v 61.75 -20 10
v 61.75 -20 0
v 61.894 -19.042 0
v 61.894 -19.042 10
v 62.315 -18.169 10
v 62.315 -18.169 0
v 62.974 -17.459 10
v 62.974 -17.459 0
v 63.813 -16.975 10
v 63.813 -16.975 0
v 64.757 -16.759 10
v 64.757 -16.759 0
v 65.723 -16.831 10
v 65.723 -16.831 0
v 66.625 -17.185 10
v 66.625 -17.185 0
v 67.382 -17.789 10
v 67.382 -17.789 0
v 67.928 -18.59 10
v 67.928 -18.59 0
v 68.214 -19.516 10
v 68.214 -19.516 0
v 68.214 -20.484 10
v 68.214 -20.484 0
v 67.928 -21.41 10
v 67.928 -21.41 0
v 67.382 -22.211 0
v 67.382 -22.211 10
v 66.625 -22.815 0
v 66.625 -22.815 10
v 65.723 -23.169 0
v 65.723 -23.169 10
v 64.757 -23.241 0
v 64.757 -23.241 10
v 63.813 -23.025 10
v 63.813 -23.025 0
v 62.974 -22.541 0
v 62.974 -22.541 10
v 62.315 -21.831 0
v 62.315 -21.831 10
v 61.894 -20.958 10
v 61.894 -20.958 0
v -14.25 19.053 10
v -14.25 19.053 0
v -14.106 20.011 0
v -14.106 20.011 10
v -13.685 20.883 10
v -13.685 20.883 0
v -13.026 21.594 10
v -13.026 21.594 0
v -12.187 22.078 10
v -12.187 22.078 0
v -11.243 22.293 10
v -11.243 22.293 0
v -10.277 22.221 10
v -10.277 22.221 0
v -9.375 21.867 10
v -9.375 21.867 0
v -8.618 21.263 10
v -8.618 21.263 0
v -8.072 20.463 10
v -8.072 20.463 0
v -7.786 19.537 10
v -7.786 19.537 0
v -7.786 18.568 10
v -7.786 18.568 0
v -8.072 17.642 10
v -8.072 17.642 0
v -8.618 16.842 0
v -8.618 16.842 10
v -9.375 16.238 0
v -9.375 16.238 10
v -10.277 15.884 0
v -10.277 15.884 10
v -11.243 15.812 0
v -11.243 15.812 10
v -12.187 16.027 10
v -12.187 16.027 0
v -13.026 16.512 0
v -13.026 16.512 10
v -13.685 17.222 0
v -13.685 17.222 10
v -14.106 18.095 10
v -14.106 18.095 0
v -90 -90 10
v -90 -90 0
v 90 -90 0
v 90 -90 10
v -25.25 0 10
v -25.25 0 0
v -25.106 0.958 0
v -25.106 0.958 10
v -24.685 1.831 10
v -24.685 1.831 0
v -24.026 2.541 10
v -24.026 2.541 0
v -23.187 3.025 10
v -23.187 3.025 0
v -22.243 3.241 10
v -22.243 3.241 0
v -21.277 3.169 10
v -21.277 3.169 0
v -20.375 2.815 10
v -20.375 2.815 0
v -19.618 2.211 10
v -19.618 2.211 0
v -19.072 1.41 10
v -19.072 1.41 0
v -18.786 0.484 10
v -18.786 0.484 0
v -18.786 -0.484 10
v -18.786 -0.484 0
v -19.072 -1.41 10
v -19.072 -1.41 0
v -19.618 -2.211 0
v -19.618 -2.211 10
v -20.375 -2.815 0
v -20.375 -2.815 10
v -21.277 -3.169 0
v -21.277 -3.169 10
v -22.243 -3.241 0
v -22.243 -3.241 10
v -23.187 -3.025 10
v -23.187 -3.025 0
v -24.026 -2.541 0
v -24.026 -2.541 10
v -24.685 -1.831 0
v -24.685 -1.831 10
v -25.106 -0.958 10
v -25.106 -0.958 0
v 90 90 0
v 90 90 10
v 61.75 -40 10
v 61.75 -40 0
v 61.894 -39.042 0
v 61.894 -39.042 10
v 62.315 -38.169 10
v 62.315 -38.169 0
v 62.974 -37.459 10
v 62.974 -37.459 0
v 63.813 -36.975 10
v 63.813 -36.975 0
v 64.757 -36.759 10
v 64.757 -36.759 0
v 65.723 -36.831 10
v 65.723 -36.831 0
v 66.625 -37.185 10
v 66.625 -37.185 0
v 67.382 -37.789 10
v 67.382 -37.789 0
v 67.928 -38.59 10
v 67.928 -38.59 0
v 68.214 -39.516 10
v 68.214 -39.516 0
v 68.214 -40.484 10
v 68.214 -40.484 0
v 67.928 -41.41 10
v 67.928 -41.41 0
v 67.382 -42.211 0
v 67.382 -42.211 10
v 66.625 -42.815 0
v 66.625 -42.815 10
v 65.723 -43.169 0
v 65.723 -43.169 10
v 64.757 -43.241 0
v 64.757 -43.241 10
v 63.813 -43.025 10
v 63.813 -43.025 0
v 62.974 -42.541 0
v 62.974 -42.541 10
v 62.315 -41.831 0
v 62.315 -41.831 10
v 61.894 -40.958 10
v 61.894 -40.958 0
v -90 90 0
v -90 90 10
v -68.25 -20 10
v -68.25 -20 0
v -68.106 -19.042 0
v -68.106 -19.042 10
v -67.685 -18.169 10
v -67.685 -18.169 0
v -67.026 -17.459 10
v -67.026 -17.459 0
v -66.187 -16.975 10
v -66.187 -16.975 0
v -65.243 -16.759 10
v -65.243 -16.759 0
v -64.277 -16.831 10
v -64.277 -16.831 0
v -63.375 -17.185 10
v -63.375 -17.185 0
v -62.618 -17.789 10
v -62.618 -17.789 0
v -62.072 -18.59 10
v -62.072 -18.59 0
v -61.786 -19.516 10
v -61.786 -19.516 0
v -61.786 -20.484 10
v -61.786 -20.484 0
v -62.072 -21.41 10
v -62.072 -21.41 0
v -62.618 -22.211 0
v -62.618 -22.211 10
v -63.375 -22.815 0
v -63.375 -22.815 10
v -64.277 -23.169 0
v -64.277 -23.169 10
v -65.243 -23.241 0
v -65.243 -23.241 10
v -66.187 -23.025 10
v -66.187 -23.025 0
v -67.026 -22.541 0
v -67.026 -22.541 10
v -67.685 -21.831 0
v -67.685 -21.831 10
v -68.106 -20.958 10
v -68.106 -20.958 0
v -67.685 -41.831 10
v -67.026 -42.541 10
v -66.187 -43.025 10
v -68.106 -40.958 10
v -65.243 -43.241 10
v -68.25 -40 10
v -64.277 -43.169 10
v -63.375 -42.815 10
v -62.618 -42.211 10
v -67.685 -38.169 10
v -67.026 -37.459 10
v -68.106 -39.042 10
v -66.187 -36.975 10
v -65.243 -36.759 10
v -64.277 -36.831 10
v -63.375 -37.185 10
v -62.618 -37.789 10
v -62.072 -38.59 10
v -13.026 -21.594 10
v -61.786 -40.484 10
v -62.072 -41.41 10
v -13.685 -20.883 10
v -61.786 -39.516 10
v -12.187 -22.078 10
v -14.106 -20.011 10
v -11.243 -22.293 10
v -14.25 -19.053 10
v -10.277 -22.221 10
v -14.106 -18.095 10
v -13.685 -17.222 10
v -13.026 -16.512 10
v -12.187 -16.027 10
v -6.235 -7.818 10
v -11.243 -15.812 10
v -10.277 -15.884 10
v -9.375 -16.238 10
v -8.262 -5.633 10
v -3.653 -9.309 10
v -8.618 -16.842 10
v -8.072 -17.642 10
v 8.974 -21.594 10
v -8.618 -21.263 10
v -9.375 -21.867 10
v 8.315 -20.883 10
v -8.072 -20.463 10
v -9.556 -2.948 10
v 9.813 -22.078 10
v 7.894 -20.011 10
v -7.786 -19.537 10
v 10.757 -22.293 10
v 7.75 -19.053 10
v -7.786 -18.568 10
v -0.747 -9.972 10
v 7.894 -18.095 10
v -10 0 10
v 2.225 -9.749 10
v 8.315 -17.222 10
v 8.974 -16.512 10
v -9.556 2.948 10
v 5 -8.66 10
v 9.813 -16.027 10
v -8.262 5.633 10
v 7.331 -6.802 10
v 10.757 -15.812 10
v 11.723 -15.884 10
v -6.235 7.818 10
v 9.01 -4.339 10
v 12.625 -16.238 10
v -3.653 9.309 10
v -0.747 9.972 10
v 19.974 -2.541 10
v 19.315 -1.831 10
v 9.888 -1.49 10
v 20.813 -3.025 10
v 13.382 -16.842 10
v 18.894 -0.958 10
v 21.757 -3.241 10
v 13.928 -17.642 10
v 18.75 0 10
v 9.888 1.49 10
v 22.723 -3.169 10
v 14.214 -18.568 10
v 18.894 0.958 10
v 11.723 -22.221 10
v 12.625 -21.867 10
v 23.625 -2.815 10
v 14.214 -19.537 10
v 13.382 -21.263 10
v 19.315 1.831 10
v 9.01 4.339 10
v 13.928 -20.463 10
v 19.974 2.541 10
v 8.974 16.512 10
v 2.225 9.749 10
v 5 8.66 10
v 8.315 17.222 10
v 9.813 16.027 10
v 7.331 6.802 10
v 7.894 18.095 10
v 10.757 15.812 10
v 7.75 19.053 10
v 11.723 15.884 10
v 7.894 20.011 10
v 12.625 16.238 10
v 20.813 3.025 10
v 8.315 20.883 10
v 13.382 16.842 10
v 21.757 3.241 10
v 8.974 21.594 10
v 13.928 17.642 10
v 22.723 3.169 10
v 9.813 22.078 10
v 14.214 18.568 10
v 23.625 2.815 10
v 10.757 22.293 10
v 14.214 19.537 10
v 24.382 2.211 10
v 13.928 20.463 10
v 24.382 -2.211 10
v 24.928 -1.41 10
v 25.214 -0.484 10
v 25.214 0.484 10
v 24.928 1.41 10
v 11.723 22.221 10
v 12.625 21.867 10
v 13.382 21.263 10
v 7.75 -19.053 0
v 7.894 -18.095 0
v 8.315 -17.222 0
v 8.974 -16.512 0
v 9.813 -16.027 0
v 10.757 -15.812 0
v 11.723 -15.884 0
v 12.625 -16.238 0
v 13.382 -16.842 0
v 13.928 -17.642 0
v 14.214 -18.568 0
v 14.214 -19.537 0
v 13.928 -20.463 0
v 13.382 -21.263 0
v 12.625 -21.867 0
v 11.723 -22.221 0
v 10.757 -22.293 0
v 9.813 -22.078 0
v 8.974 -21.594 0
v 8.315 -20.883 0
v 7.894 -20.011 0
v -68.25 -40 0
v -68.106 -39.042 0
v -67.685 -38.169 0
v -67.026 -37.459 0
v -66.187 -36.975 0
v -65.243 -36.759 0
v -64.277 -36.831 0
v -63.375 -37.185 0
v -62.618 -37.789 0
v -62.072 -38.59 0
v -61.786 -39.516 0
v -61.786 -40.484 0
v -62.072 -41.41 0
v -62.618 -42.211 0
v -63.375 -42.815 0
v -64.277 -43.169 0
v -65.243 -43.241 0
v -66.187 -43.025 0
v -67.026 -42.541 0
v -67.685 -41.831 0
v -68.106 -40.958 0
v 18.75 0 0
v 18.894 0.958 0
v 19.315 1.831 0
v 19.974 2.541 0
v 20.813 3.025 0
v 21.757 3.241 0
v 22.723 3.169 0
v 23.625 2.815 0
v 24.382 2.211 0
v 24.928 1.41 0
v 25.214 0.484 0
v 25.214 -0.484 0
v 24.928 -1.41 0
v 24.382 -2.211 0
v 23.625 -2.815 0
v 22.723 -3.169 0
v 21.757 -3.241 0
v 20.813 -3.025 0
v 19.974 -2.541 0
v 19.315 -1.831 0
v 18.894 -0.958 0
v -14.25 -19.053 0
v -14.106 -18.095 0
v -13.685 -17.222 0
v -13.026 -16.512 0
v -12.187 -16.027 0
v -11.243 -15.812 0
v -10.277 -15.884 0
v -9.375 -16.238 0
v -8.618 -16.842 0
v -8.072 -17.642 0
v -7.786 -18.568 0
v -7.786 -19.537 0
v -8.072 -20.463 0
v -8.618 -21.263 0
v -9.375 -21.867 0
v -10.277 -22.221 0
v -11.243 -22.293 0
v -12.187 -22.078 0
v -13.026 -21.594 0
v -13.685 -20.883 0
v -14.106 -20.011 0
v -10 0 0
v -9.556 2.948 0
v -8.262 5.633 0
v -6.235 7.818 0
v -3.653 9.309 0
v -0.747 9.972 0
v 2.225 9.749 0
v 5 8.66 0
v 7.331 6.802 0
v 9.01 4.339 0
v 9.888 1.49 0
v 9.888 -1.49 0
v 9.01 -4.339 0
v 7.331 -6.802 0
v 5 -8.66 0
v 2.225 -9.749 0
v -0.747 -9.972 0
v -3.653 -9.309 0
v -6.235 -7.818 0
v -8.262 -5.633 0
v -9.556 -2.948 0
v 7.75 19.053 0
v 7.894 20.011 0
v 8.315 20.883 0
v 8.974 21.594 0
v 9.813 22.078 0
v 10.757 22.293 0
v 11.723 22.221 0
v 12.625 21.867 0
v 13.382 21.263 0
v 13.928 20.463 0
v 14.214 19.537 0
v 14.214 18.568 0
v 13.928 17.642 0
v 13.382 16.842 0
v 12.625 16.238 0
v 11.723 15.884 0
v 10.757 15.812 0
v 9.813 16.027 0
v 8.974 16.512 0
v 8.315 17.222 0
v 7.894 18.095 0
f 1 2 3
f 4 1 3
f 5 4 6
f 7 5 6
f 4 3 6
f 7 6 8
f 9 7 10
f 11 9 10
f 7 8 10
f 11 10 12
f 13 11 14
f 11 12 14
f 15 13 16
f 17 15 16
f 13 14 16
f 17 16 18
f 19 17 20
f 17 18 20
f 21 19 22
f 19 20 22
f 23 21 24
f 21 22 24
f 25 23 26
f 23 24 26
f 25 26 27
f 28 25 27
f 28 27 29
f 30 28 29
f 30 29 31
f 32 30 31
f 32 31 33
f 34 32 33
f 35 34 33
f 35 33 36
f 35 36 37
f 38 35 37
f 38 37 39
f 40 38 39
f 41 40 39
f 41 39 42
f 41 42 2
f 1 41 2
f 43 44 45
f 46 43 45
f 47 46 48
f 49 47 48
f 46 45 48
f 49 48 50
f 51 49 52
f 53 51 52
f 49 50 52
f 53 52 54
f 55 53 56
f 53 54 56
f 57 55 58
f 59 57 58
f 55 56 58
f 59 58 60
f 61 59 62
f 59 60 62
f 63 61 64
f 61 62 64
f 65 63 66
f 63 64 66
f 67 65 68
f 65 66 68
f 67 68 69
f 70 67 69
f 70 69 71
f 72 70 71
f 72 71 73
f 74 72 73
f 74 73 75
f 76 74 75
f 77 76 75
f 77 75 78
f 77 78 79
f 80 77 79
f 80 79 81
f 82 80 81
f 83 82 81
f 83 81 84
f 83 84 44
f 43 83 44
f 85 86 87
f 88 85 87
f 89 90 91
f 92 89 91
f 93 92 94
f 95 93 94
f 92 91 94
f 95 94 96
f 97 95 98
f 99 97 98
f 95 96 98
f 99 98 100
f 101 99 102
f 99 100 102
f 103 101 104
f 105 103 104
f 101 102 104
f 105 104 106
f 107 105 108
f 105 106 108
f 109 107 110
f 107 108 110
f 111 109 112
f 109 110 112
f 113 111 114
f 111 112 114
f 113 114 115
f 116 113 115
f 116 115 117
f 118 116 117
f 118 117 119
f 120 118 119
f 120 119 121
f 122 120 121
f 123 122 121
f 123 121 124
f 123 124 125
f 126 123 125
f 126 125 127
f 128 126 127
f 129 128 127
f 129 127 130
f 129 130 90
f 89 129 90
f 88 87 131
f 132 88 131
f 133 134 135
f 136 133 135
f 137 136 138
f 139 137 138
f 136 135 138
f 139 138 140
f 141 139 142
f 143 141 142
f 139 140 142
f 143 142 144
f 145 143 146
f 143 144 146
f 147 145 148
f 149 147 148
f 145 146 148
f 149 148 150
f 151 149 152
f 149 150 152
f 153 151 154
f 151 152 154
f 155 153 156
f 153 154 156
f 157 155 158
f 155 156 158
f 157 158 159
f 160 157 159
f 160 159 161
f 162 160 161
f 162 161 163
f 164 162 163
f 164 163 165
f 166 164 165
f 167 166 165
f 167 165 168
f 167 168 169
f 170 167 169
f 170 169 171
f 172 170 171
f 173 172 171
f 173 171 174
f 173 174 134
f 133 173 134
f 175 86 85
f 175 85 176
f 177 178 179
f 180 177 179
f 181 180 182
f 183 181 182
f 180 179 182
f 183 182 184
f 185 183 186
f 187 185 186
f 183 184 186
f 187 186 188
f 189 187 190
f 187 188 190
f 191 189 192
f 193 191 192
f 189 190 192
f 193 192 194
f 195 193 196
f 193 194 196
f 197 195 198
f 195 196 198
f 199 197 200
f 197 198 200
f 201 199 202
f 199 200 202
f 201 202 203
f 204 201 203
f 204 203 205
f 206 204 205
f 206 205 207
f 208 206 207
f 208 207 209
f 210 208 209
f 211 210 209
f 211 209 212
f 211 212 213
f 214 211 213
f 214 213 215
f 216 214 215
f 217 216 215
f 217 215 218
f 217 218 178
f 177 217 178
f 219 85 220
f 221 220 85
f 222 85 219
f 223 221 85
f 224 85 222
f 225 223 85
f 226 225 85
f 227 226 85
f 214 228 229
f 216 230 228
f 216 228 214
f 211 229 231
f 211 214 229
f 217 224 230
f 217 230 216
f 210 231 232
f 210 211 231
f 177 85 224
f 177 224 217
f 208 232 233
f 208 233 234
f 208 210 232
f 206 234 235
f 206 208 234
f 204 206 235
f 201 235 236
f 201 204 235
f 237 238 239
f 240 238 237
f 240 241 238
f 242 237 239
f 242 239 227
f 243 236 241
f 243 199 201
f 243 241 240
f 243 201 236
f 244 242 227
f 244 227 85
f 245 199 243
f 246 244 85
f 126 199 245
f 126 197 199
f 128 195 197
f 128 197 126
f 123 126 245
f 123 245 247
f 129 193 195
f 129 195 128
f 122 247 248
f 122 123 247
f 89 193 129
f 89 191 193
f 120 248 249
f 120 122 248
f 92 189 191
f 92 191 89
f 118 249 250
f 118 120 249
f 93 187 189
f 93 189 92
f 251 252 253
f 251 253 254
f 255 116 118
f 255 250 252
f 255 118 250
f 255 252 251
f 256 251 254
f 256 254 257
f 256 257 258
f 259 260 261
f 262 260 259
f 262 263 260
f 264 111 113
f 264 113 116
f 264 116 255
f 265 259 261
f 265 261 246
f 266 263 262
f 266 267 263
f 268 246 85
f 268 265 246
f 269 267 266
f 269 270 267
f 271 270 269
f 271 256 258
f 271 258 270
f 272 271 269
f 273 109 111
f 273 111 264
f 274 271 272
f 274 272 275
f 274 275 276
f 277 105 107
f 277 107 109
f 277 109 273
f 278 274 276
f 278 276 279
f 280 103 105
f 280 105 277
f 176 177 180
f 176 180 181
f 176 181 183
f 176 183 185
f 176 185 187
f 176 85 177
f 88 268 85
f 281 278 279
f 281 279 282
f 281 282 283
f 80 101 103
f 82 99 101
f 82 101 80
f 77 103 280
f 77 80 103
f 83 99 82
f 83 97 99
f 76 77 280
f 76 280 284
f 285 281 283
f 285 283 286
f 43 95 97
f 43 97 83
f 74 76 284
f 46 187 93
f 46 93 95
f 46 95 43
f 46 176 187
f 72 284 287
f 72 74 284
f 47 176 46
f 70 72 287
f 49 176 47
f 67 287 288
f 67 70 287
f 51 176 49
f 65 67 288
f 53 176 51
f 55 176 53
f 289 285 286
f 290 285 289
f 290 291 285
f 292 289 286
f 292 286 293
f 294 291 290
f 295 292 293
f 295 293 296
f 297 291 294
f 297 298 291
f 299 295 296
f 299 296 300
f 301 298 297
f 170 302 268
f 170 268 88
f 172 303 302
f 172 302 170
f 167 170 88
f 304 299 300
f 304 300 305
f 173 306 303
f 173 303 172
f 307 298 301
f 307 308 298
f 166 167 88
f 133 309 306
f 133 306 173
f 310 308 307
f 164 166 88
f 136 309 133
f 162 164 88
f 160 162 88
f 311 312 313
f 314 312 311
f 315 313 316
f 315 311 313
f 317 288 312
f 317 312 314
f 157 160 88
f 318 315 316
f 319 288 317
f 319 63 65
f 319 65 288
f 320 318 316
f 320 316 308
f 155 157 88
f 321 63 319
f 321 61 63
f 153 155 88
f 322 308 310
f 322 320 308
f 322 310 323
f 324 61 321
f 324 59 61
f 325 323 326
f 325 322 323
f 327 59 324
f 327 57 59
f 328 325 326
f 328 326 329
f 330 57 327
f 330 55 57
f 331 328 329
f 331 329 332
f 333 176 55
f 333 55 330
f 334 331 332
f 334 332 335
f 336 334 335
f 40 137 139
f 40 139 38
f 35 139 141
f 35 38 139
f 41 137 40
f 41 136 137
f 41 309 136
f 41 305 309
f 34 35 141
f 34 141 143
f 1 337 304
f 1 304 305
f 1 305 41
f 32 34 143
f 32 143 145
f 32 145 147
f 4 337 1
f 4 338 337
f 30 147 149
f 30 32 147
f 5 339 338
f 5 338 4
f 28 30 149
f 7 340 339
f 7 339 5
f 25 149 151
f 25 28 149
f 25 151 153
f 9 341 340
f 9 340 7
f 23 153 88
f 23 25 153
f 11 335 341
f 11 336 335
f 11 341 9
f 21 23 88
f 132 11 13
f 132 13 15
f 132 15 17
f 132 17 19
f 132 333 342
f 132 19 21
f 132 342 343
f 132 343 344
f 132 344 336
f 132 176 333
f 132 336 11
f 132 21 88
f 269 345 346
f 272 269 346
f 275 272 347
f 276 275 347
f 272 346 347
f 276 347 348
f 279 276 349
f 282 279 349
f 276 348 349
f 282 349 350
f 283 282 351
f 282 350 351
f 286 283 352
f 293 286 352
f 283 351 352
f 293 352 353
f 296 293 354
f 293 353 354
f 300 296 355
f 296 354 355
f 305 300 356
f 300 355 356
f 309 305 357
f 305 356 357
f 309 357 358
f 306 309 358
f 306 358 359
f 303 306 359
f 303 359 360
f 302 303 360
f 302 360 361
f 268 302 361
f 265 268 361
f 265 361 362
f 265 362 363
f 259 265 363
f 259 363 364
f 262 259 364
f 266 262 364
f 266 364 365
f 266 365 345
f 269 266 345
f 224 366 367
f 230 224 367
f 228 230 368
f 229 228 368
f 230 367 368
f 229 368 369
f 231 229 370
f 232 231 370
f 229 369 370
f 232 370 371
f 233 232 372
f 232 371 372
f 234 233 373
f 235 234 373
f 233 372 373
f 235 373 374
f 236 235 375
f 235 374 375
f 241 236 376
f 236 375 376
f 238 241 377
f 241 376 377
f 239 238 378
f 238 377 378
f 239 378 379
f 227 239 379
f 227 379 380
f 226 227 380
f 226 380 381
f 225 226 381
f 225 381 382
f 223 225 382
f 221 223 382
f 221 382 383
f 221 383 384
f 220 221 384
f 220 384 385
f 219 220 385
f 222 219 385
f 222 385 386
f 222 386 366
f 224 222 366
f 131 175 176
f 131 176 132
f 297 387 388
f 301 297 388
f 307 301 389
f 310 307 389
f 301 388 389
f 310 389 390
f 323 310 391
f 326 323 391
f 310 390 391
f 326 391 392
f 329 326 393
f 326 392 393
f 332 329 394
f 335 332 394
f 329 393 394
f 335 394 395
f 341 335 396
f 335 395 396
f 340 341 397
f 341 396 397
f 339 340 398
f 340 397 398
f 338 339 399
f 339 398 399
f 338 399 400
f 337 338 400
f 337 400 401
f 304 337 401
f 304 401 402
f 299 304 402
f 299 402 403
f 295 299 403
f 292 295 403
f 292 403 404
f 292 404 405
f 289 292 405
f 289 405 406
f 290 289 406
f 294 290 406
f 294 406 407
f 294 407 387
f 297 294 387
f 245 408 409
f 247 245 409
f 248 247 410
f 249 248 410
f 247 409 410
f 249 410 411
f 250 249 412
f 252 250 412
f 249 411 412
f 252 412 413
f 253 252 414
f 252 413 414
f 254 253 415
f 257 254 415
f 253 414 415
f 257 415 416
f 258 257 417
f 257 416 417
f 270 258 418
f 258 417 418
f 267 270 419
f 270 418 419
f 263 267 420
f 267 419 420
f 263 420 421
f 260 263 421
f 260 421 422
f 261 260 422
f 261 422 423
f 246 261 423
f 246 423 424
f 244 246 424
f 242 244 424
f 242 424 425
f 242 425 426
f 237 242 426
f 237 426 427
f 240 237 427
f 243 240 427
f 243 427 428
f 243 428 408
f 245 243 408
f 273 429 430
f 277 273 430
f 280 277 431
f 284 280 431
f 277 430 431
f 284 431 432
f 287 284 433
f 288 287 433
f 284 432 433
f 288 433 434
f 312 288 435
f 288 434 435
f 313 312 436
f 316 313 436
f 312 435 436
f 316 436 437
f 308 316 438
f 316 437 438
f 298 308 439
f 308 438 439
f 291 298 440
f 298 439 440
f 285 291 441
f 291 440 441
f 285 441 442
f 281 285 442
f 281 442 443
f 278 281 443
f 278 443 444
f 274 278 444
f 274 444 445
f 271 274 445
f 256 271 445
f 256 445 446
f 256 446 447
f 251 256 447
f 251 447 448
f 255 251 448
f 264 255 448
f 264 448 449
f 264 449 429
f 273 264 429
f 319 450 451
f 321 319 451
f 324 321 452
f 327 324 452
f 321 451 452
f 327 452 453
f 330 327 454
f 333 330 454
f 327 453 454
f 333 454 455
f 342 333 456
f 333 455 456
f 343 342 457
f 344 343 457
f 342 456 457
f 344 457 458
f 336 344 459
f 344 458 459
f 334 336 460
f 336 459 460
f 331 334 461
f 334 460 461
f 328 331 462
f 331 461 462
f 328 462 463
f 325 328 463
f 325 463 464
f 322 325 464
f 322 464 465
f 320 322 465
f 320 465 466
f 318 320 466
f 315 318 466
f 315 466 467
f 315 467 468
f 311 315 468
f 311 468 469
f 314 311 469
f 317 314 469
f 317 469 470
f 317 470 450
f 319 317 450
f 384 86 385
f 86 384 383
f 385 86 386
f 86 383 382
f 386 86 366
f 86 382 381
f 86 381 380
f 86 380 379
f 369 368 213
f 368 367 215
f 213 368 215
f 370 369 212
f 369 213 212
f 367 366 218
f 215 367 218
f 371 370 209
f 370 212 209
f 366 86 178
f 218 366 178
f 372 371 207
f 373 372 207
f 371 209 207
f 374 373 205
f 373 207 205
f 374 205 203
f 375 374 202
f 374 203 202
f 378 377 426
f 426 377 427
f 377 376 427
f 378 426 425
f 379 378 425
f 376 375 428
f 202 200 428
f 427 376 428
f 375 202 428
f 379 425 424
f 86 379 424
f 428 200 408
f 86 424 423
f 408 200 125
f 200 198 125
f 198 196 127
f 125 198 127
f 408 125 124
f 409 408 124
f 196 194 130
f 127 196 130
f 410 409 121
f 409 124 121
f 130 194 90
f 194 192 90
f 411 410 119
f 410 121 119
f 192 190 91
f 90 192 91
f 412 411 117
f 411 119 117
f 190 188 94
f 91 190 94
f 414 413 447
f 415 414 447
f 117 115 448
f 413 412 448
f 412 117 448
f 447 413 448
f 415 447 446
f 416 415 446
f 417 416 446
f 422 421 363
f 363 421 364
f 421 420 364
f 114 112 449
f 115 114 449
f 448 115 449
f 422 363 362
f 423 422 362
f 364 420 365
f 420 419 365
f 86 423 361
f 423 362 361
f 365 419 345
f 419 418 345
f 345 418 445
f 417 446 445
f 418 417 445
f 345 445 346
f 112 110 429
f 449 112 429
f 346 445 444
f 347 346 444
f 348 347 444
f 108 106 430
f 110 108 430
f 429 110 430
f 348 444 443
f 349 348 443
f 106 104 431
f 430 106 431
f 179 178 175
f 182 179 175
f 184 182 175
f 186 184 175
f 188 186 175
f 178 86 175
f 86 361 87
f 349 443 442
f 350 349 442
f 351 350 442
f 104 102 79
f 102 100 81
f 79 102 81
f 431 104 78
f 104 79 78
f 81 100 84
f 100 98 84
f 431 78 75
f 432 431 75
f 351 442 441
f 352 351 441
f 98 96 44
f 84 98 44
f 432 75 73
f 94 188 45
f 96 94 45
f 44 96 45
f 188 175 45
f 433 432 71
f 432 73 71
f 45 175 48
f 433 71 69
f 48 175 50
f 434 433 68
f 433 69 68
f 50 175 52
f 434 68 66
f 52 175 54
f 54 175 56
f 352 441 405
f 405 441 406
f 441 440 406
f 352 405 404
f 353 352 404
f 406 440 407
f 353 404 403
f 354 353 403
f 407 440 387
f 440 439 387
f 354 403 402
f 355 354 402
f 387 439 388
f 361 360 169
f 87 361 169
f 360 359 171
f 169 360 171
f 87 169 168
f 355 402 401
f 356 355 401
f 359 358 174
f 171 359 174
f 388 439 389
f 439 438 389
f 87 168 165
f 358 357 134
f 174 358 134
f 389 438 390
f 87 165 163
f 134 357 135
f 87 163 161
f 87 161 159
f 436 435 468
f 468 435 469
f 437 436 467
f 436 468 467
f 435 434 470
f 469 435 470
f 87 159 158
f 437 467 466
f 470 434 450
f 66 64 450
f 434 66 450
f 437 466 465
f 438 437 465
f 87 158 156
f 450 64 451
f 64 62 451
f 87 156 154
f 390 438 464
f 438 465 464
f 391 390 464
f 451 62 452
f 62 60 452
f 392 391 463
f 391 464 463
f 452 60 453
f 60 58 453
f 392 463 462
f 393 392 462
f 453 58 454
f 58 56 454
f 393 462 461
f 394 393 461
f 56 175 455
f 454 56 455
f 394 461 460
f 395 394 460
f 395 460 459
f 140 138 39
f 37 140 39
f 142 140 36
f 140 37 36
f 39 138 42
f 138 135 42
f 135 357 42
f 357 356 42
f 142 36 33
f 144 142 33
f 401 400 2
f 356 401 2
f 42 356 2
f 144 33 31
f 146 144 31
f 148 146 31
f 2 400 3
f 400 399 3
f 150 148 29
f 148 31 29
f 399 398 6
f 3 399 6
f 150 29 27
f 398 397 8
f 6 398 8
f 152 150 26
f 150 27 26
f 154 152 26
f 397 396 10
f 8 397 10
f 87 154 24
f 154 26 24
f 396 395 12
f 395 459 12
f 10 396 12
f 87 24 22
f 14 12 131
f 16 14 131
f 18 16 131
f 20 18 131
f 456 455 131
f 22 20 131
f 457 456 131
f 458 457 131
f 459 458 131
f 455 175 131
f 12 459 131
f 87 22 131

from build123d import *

# Parameters (mm, degrees)
SKETCH_1_W          = 180
SKETCH_1_H          = 180
EXTRUDE_1_DEPTH     = 10
SKETCH_2_R          = 10
SKETCH_2_R_2        = 3.25
CUT_EXTRUDE_1_DEPTH = 11


with BuildPart() as part:
    # 草图1 → 凸台-拉伸1 (new body)
    with BuildSketch(Plane.XY):
        Rectangle(SKETCH_1_W, SKETCH_1_H)
    extrude(amount=EXTRUDE_1_DEPTH)

    # 草图2 → 切除-拉伸1 (cut)
    with BuildSketch(Plane(origin=(0, 0, 0), x_dir=(-1, 0, 0), z_dir=(0, 0, -1))):
        Circle(SKETCH_2_R)
        with Locations((-22, 0)):
            Circle(SKETCH_2_R_2)
        with Locations((-11, 19.052558883)):
            Circle(SKETCH_2_R_2)
        with Locations((11, 19.052558883)):
            Circle(SKETCH_2_R_2)
        with Locations((22, 0)):
            Circle(SKETCH_2_R_2)
        with Locations((11, -19.052558883)):
            Circle(SKETCH_2_R_2)
        with Locations((-11, -19.052558883)):
            Circle(SKETCH_2_R_2)
        with Locations((65, -20)):
            Circle(SKETCH_2_R_2)
        with Locations((65, -40)):
            Circle(SKETCH_2_R_2)
        with Locations((-65, -20)):
            Circle(SKETCH_2_R_2)
        with Locations((-65, -40)):
            Circle(SKETCH_2_R_2)
    extrude(amount=-CUT_EXTRUDE_1_DEPTH, mode=Mode.SUBTRACT)


solid = part.part
